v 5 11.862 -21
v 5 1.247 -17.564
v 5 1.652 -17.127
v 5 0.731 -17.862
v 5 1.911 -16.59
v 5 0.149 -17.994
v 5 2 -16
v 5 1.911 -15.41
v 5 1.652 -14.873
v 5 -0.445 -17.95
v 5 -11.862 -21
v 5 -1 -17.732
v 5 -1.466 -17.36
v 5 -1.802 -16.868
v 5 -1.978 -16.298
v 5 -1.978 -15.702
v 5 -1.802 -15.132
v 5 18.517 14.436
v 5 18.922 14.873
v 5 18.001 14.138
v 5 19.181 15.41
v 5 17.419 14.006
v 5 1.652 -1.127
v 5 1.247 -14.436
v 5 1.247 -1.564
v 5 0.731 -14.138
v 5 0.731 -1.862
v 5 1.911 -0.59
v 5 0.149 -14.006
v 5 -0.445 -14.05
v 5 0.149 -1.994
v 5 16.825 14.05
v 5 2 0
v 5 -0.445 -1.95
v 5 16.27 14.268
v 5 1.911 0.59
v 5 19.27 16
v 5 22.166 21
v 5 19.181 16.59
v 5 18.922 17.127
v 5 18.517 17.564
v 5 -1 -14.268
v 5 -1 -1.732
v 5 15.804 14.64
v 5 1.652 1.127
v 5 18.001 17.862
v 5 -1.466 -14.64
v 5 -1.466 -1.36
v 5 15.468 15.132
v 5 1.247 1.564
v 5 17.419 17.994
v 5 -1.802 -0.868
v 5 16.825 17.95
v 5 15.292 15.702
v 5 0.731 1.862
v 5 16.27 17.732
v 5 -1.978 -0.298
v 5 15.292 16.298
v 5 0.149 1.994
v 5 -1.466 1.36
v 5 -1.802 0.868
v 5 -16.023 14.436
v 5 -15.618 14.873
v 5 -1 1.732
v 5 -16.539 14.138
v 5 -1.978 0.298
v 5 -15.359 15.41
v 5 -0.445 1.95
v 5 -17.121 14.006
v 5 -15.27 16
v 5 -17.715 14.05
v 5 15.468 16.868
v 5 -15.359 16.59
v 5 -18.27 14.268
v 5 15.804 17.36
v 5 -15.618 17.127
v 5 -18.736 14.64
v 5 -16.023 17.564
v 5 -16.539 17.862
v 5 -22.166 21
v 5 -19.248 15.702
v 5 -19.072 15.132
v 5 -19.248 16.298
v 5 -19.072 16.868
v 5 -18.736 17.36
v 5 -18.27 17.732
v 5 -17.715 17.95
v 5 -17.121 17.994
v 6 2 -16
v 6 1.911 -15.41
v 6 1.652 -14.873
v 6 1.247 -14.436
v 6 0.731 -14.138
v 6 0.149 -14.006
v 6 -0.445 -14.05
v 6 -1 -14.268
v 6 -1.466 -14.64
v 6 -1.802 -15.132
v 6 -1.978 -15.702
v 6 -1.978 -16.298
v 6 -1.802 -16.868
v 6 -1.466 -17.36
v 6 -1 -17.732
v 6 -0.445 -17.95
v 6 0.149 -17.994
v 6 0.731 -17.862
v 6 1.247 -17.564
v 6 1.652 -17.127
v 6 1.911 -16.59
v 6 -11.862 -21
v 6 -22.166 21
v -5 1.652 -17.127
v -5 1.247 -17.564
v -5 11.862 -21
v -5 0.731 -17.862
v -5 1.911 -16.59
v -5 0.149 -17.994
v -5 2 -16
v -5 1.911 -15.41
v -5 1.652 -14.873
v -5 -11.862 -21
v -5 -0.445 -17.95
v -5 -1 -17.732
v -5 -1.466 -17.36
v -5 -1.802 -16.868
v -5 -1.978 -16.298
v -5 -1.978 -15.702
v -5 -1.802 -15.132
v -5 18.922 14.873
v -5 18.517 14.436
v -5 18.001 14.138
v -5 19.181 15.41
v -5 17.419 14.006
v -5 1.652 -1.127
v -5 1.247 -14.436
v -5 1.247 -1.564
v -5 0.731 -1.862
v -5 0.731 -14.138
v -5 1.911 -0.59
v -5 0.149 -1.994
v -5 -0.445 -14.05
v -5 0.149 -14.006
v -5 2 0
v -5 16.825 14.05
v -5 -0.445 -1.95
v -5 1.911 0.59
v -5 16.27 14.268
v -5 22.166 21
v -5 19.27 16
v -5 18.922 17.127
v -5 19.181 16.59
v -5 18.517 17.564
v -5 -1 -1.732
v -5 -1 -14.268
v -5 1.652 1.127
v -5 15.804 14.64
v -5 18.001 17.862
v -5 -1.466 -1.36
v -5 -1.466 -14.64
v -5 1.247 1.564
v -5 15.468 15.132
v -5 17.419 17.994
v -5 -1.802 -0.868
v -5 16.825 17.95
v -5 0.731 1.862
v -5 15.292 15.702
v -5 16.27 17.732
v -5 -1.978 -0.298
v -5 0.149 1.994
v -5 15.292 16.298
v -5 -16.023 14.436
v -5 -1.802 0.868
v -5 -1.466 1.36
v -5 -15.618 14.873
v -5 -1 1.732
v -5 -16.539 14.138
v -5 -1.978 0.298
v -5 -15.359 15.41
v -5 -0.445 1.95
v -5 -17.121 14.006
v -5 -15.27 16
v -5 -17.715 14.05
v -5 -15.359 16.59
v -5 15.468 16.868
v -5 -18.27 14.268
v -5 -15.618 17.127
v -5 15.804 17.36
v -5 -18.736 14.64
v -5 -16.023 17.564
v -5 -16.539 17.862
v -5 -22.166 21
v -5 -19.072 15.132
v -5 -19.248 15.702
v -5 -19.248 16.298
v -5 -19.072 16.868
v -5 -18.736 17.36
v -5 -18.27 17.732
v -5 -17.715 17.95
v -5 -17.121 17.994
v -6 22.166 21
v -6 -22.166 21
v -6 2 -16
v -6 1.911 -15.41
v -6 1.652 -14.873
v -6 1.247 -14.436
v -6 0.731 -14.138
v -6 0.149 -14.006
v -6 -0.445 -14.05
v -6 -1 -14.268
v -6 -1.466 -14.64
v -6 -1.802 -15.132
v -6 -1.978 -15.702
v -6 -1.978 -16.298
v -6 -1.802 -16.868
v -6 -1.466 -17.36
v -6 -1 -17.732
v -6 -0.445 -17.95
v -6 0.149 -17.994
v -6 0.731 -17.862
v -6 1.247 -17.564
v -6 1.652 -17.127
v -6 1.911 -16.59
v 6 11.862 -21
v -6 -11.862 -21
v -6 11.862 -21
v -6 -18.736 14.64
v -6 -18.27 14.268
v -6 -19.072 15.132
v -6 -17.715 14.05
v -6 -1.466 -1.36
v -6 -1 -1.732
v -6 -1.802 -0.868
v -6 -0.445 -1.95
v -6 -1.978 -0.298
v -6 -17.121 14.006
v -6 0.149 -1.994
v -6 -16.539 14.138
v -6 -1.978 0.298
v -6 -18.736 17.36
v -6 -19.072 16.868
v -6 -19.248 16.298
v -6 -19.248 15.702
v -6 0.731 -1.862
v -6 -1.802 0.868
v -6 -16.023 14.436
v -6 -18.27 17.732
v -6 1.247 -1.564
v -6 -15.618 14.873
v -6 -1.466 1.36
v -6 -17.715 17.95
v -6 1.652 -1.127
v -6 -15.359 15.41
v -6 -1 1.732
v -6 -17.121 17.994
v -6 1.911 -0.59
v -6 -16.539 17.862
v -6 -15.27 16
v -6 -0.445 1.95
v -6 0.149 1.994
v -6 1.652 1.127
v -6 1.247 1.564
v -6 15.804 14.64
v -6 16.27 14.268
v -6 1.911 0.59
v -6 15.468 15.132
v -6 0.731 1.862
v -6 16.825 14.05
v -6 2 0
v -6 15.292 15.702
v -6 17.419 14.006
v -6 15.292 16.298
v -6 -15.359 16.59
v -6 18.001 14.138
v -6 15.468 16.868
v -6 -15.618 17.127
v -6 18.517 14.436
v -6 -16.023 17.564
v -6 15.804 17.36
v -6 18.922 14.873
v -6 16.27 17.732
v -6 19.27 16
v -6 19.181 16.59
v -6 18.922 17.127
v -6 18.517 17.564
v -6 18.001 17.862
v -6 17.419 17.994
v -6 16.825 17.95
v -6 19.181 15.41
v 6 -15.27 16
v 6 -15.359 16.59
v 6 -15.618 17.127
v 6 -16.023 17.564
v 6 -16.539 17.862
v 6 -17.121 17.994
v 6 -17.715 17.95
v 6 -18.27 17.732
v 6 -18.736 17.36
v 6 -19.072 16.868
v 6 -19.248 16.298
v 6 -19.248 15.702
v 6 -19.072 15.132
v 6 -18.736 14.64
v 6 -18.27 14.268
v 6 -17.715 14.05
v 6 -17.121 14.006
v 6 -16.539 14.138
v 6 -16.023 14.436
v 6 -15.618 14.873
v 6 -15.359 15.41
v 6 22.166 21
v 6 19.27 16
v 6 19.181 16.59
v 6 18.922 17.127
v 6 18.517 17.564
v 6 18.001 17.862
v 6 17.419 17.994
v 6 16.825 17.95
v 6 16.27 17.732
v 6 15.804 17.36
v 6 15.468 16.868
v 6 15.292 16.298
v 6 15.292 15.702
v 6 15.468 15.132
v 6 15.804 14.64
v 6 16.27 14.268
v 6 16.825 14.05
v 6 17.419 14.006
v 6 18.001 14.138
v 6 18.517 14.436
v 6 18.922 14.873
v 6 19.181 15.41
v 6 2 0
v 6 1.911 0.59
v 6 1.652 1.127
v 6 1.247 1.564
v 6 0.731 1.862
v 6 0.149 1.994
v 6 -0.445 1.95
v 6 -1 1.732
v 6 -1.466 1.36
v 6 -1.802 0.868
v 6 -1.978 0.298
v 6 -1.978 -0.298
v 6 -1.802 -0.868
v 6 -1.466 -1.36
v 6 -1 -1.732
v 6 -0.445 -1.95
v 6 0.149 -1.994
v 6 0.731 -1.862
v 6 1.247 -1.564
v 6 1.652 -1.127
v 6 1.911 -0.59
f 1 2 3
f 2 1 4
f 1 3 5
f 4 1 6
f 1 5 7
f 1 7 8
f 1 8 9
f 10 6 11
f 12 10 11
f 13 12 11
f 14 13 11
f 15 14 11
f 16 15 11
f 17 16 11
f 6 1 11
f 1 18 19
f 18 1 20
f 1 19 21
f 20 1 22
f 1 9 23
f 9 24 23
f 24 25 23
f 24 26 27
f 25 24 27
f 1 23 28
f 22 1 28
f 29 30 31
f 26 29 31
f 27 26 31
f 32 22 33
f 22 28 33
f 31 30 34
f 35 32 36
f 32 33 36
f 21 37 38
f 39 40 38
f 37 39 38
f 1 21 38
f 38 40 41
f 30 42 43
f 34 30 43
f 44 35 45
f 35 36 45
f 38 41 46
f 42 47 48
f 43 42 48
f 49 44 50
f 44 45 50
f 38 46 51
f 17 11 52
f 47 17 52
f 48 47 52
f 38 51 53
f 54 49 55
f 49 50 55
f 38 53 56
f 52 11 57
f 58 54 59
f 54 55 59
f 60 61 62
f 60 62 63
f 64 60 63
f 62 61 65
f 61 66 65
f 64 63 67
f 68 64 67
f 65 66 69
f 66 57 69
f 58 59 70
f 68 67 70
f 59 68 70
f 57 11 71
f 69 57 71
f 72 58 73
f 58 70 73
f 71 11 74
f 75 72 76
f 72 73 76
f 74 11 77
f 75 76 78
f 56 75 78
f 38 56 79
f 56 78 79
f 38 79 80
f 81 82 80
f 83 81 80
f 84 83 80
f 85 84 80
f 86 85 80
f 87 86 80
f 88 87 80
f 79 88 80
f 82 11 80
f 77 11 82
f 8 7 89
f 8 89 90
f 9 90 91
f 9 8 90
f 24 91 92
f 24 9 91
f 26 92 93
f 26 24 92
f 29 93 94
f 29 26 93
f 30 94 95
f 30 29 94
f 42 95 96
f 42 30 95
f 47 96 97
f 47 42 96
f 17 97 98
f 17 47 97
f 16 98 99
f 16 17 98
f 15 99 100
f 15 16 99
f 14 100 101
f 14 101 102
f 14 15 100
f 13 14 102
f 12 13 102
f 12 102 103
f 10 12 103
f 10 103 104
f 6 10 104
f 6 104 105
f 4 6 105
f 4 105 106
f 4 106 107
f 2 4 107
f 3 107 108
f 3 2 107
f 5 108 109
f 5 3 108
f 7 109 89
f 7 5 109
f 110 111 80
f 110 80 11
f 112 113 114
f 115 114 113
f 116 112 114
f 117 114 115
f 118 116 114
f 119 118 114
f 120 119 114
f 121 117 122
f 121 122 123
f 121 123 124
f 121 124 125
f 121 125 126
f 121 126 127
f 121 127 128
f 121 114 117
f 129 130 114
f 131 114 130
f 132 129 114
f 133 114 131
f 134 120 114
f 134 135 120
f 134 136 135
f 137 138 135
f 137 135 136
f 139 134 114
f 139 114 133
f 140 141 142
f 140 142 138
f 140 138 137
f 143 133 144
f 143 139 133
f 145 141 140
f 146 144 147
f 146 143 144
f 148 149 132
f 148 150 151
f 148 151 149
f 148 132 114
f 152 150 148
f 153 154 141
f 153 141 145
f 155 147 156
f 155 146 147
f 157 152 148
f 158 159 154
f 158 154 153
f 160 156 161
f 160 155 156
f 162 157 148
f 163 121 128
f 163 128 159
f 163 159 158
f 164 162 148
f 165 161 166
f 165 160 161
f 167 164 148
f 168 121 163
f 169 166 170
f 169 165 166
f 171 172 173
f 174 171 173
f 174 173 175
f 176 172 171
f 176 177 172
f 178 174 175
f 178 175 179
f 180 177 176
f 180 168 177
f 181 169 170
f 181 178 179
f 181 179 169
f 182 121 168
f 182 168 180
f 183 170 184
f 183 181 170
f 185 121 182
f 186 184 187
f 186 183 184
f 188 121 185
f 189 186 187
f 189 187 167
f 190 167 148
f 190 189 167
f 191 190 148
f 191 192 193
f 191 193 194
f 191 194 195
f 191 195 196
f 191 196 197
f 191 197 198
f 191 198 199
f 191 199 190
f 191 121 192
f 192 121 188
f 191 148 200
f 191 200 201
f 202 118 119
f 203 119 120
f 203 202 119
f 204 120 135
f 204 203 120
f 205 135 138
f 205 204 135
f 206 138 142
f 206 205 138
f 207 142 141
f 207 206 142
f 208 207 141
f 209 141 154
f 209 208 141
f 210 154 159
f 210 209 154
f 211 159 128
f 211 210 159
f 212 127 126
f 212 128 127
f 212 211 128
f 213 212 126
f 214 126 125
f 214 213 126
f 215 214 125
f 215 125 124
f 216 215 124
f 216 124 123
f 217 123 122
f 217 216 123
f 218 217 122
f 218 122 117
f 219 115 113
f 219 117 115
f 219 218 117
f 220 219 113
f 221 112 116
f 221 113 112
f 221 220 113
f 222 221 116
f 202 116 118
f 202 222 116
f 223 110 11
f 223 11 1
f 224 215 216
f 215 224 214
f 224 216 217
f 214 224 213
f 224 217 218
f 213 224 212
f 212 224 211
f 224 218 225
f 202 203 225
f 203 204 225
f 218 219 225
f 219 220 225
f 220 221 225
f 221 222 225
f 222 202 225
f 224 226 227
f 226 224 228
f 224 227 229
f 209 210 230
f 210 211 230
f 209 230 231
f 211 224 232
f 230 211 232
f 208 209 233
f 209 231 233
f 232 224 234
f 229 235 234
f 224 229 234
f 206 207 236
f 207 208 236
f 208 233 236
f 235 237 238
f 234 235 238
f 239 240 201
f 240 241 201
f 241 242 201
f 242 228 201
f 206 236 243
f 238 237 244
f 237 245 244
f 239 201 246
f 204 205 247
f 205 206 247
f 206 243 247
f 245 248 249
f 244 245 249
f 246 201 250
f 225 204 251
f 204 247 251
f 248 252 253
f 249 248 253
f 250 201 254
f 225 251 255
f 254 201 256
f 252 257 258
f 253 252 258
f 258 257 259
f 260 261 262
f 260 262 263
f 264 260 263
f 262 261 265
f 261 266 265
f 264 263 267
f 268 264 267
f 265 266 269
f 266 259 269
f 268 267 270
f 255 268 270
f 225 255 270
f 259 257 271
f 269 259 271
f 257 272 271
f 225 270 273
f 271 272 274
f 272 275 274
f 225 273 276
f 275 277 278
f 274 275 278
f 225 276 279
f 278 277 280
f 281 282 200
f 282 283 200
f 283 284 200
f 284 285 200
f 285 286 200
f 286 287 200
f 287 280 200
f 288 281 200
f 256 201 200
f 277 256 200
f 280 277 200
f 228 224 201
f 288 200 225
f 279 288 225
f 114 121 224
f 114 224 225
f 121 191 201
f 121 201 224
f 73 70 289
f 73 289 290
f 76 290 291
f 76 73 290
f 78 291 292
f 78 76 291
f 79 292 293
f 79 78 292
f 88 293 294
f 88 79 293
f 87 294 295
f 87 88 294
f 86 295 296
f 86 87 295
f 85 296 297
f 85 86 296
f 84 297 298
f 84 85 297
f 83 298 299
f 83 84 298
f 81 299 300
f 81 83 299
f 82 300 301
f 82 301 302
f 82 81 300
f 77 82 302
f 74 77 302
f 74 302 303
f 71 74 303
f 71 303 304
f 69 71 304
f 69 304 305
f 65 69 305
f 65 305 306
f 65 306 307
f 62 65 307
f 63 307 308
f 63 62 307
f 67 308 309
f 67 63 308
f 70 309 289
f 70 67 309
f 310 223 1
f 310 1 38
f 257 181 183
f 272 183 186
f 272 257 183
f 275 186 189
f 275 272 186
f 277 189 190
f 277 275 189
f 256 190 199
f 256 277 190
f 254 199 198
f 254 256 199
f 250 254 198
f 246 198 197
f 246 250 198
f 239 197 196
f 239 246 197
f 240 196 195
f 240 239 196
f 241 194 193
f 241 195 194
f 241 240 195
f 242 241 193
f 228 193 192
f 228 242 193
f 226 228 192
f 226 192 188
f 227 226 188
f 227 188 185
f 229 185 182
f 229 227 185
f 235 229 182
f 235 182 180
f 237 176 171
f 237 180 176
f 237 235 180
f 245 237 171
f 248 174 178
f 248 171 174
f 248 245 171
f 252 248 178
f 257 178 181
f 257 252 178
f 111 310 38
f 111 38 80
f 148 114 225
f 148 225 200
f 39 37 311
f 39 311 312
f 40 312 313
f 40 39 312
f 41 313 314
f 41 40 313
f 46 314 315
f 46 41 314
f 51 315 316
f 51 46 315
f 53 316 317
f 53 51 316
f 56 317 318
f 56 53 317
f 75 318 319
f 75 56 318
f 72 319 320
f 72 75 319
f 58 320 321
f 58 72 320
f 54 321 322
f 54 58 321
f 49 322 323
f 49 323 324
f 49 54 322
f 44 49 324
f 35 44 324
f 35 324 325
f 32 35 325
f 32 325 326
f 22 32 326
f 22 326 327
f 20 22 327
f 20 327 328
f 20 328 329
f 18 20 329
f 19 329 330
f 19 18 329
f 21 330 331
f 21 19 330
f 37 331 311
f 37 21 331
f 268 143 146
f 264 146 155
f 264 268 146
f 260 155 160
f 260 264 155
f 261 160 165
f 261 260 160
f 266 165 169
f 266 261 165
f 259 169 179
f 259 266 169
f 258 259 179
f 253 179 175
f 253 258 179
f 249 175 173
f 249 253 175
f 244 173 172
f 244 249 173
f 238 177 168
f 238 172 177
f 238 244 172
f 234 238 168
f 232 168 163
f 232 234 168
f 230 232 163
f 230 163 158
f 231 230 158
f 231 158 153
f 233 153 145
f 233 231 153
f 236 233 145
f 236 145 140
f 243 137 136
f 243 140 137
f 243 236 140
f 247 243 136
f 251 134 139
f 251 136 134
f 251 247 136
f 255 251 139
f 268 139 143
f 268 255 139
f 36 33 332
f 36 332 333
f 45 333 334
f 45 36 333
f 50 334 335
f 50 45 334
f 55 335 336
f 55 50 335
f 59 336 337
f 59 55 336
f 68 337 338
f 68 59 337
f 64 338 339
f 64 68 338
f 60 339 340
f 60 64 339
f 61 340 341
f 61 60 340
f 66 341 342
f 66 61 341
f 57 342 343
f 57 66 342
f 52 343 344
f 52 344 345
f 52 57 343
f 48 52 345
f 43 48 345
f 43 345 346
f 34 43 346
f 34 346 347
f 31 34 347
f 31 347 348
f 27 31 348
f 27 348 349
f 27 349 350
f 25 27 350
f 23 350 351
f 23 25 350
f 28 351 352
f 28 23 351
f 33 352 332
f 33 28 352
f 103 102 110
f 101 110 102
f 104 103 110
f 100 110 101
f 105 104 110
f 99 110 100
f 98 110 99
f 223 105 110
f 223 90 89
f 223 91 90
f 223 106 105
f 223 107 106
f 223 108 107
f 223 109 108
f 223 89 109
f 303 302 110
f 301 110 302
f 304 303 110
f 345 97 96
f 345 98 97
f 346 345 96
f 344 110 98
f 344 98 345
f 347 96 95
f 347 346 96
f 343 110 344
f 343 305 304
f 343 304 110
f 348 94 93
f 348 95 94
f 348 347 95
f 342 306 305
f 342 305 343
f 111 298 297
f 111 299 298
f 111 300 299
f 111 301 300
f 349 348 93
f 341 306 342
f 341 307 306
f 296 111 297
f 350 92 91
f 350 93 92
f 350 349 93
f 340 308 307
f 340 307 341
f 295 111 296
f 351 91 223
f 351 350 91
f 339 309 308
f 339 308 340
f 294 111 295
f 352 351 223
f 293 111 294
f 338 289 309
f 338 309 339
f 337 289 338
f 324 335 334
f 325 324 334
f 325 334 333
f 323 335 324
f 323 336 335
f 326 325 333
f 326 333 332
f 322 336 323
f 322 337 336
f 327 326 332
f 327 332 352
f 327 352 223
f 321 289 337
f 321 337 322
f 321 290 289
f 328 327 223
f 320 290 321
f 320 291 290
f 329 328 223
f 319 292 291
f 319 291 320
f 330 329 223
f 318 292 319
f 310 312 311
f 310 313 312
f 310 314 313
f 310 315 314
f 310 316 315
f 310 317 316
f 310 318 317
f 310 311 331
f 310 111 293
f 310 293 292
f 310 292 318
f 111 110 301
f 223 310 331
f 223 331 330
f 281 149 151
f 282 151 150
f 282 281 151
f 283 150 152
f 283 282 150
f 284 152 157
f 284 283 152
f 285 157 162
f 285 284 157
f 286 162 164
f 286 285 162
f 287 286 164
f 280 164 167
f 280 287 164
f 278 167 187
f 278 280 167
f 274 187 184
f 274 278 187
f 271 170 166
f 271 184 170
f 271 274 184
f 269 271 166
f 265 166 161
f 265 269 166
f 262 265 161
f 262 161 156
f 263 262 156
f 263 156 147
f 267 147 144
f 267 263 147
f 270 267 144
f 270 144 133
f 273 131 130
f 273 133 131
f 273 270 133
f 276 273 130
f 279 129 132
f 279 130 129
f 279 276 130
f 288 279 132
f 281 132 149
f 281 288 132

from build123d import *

# Parameters (mm, degrees)
F0_R     = 2
F1_DEPTH = 6
F2_W     = 10
F2_H     = 78.507696
F3_DEPTH = 50


with BuildPart() as f1:
    # F0 (on Right) → F1 (new body, symmetric)
    with BuildSketch(Plane.YZ):
        Polygon((22.16609, 21), (0, 21), (-22.16609, 21), (-11.862469, -21), (0, -21), (11.862469, -21), align=None)
        with Locations((0, -16)):
            Circle(F0_R, mode=Mode.SUBTRACT)
        with Locations((-17.27, 16)):
            Circle(F0_R, mode=Mode.SUBTRACT)
        Circle(F0_R, mode=Mode.SUBTRACT)
        with Locations((17.27, 16)):
            Circle(F0_R, mode=Mode.SUBTRACT)
    extrude(amount=F1_DEPTH, both=True)

    # F2 (on Front) → F3 (cut, symmetric)
    with BuildSketch(Plane.XZ):
        Rectangle(F2_W, F2_H)
    extrude(amount=F3_DEPTH, both=True, mode=Mode.SUBTRACT)


solid = f1.part
